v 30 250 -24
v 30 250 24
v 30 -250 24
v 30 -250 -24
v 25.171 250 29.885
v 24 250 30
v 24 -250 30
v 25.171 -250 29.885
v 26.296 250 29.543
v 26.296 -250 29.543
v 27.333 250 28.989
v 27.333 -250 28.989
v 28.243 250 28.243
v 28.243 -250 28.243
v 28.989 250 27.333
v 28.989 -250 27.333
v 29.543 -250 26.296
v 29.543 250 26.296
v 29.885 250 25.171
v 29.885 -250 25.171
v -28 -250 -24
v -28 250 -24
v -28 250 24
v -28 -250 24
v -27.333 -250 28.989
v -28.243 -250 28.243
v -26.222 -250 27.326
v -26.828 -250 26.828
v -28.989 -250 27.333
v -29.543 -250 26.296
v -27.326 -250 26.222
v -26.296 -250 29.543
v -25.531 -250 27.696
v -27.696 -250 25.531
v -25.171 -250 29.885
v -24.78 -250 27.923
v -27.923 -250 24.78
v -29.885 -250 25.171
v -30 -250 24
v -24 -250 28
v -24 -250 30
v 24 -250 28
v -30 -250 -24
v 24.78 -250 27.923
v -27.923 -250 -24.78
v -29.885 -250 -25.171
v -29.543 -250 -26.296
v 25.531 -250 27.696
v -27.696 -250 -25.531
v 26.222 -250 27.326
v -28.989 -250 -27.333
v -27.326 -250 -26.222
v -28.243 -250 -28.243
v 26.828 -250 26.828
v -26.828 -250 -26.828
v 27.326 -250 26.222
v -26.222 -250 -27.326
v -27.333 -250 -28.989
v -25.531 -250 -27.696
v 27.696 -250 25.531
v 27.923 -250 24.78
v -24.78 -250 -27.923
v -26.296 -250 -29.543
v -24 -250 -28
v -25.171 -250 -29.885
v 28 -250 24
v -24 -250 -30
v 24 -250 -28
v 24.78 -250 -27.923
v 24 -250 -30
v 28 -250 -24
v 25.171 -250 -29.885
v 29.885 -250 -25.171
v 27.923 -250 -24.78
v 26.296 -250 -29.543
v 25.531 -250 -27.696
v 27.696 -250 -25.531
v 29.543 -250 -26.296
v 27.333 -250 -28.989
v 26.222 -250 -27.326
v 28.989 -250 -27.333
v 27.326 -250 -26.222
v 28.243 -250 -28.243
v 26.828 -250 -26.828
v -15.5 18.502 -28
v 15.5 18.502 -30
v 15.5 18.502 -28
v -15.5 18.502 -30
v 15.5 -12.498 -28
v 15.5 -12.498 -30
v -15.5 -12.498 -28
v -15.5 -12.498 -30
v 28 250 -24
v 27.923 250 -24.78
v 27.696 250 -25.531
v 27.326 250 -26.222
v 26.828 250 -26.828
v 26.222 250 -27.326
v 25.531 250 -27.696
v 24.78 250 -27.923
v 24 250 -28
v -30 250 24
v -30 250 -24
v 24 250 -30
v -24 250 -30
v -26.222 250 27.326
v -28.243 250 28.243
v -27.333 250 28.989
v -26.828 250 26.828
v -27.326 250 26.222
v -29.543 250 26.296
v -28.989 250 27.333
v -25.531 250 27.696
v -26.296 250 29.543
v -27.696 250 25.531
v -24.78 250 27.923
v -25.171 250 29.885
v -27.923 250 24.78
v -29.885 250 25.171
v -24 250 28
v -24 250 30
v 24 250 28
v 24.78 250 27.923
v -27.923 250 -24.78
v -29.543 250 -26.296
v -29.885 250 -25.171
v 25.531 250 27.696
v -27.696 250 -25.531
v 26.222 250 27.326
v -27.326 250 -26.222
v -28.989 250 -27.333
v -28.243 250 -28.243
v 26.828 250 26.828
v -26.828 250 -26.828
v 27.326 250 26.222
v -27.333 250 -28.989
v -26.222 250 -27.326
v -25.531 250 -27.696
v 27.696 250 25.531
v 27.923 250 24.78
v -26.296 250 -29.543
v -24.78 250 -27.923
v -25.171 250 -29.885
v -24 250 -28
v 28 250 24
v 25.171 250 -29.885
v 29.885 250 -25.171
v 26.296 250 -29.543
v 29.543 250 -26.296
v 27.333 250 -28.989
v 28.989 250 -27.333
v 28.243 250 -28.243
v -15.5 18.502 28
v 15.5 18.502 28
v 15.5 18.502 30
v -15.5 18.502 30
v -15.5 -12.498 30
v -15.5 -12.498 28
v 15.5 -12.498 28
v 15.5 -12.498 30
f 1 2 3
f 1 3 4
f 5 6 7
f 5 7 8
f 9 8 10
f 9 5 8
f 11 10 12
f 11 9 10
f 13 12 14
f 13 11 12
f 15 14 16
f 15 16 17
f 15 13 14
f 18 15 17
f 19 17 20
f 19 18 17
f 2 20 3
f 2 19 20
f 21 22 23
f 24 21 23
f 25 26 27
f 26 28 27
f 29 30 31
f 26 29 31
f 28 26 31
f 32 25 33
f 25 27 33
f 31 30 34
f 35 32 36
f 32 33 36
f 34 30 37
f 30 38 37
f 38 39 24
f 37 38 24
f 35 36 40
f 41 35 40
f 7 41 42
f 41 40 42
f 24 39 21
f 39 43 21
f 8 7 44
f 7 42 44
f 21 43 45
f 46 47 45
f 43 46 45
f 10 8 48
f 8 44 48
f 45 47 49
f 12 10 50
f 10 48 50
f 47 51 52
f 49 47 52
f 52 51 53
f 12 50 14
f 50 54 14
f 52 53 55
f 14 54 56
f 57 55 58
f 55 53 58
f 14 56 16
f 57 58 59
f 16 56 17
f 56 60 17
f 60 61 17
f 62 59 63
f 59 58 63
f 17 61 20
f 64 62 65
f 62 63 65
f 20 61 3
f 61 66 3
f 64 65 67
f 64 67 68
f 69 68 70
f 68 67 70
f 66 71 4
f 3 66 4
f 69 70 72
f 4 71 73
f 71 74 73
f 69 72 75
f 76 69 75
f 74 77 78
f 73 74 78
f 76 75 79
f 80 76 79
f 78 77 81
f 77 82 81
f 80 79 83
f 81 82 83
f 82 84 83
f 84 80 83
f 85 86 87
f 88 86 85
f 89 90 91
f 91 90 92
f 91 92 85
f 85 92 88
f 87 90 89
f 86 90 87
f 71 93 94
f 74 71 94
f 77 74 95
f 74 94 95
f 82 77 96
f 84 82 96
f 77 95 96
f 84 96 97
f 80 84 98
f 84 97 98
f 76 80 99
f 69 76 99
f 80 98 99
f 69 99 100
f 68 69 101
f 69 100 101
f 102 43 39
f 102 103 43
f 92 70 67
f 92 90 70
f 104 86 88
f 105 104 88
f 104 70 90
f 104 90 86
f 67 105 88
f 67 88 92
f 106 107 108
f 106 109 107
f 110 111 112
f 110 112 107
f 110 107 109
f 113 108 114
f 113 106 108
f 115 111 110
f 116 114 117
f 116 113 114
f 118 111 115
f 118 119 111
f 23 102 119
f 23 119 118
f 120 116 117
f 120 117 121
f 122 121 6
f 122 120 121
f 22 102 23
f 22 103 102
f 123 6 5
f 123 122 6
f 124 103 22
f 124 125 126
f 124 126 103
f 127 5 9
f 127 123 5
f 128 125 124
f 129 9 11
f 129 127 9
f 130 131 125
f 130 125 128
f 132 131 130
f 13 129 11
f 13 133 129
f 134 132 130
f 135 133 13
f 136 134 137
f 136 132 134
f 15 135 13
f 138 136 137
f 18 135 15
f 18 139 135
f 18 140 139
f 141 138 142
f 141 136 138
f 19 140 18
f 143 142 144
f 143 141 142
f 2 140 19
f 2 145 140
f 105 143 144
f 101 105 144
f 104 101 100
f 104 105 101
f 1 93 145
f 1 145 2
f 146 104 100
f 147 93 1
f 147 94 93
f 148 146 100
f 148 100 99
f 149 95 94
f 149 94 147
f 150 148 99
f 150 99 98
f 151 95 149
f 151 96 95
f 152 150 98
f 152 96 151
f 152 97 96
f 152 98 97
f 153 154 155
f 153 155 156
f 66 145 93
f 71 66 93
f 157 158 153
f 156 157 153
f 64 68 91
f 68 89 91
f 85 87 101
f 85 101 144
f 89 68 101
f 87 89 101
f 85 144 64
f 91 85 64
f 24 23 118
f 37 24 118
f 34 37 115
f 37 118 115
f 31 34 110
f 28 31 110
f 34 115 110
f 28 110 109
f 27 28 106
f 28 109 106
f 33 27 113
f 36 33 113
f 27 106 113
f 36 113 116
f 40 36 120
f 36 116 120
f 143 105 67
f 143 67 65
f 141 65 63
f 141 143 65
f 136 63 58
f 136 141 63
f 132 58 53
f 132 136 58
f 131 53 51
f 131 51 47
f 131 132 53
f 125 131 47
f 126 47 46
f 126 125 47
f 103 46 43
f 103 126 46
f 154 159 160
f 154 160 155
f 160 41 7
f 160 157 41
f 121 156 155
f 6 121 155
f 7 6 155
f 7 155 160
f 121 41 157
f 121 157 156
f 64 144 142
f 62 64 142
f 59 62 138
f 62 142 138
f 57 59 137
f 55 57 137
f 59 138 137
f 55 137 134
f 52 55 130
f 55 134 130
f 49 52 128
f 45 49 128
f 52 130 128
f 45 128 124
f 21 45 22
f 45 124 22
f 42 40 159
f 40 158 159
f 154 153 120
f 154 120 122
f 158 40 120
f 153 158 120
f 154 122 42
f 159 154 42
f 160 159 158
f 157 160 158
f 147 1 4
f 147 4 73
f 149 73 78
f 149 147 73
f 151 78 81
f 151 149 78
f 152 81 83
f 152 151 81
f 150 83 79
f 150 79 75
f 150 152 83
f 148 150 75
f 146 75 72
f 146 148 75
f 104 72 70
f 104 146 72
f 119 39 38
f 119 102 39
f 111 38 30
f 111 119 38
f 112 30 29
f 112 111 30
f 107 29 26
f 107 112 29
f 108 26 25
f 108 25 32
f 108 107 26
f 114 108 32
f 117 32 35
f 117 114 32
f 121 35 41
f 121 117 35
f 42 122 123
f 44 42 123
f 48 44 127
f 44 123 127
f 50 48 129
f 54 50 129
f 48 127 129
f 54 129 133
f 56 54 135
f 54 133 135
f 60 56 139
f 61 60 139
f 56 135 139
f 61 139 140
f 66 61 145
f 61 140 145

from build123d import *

# Parameters (mm, degrees)
BOSS_EXTRUDE1_DEPTH = 250
SHELL1_T            = -2
SKETCH2_W           = 31
SKETCH2_H           = 31
CUT_EXTRUDE1_DEPTH  = 259.843582111


with BuildPart() as part:
    # Sketch1 → Boss-Extrude1 (new, symmetric)
    with BuildSketch(Plane(origin=(0, 0, 0), x_dir=(1, 0, 0), z_dir=(0, 1, 0))):
        with BuildLine():
            Line((-24, -30), (24, -30))
            ThreePointArc((24, -30), (28.242640687, -28.242640687), (30, -24))
            Line((30, -24), (30, 24))
            ThreePointArc((30, 24), (28.242640687, 28.242640687), (24, 30))
            Line((24, 30), (-24, 30))
            ThreePointArc((-24, 30), (-28.242640687, 28.242640687), (-30, 24))
            Line((-30, 24), (-30, -24))
            ThreePointArc((-30, -24), (-28.242640687, -28.242640687), (-24, -30))
        make_face()
    extrude(amount=BOSS_EXTRUDE1_DEPTH, both=True)

    # Shell1
    shell1_openings = [part.faces().sort_by_distance(p)[0] for p in [
        (0, 250, 0),
        (0, -250, 0),
    ]]
    offset(amount=SHELL1_T, openings=shell1_openings, kind=Kind.INTERSECTION)

    # Sketch2 → Cut-Extrude1 (cut, through all)
    with BuildSketch(Plane(origin=(0, 0, -30), x_dir=(-1, 0, 0), z_dir=(0, 0, -1))):
        with Locations((0, 3.002147222)):
            Rectangle(SKETCH2_W, SKETCH2_H)
    extrude(amount=-CUT_EXTRUDE1_DEPTH, mode=Mode.SUBTRACT)


solid = part.part
